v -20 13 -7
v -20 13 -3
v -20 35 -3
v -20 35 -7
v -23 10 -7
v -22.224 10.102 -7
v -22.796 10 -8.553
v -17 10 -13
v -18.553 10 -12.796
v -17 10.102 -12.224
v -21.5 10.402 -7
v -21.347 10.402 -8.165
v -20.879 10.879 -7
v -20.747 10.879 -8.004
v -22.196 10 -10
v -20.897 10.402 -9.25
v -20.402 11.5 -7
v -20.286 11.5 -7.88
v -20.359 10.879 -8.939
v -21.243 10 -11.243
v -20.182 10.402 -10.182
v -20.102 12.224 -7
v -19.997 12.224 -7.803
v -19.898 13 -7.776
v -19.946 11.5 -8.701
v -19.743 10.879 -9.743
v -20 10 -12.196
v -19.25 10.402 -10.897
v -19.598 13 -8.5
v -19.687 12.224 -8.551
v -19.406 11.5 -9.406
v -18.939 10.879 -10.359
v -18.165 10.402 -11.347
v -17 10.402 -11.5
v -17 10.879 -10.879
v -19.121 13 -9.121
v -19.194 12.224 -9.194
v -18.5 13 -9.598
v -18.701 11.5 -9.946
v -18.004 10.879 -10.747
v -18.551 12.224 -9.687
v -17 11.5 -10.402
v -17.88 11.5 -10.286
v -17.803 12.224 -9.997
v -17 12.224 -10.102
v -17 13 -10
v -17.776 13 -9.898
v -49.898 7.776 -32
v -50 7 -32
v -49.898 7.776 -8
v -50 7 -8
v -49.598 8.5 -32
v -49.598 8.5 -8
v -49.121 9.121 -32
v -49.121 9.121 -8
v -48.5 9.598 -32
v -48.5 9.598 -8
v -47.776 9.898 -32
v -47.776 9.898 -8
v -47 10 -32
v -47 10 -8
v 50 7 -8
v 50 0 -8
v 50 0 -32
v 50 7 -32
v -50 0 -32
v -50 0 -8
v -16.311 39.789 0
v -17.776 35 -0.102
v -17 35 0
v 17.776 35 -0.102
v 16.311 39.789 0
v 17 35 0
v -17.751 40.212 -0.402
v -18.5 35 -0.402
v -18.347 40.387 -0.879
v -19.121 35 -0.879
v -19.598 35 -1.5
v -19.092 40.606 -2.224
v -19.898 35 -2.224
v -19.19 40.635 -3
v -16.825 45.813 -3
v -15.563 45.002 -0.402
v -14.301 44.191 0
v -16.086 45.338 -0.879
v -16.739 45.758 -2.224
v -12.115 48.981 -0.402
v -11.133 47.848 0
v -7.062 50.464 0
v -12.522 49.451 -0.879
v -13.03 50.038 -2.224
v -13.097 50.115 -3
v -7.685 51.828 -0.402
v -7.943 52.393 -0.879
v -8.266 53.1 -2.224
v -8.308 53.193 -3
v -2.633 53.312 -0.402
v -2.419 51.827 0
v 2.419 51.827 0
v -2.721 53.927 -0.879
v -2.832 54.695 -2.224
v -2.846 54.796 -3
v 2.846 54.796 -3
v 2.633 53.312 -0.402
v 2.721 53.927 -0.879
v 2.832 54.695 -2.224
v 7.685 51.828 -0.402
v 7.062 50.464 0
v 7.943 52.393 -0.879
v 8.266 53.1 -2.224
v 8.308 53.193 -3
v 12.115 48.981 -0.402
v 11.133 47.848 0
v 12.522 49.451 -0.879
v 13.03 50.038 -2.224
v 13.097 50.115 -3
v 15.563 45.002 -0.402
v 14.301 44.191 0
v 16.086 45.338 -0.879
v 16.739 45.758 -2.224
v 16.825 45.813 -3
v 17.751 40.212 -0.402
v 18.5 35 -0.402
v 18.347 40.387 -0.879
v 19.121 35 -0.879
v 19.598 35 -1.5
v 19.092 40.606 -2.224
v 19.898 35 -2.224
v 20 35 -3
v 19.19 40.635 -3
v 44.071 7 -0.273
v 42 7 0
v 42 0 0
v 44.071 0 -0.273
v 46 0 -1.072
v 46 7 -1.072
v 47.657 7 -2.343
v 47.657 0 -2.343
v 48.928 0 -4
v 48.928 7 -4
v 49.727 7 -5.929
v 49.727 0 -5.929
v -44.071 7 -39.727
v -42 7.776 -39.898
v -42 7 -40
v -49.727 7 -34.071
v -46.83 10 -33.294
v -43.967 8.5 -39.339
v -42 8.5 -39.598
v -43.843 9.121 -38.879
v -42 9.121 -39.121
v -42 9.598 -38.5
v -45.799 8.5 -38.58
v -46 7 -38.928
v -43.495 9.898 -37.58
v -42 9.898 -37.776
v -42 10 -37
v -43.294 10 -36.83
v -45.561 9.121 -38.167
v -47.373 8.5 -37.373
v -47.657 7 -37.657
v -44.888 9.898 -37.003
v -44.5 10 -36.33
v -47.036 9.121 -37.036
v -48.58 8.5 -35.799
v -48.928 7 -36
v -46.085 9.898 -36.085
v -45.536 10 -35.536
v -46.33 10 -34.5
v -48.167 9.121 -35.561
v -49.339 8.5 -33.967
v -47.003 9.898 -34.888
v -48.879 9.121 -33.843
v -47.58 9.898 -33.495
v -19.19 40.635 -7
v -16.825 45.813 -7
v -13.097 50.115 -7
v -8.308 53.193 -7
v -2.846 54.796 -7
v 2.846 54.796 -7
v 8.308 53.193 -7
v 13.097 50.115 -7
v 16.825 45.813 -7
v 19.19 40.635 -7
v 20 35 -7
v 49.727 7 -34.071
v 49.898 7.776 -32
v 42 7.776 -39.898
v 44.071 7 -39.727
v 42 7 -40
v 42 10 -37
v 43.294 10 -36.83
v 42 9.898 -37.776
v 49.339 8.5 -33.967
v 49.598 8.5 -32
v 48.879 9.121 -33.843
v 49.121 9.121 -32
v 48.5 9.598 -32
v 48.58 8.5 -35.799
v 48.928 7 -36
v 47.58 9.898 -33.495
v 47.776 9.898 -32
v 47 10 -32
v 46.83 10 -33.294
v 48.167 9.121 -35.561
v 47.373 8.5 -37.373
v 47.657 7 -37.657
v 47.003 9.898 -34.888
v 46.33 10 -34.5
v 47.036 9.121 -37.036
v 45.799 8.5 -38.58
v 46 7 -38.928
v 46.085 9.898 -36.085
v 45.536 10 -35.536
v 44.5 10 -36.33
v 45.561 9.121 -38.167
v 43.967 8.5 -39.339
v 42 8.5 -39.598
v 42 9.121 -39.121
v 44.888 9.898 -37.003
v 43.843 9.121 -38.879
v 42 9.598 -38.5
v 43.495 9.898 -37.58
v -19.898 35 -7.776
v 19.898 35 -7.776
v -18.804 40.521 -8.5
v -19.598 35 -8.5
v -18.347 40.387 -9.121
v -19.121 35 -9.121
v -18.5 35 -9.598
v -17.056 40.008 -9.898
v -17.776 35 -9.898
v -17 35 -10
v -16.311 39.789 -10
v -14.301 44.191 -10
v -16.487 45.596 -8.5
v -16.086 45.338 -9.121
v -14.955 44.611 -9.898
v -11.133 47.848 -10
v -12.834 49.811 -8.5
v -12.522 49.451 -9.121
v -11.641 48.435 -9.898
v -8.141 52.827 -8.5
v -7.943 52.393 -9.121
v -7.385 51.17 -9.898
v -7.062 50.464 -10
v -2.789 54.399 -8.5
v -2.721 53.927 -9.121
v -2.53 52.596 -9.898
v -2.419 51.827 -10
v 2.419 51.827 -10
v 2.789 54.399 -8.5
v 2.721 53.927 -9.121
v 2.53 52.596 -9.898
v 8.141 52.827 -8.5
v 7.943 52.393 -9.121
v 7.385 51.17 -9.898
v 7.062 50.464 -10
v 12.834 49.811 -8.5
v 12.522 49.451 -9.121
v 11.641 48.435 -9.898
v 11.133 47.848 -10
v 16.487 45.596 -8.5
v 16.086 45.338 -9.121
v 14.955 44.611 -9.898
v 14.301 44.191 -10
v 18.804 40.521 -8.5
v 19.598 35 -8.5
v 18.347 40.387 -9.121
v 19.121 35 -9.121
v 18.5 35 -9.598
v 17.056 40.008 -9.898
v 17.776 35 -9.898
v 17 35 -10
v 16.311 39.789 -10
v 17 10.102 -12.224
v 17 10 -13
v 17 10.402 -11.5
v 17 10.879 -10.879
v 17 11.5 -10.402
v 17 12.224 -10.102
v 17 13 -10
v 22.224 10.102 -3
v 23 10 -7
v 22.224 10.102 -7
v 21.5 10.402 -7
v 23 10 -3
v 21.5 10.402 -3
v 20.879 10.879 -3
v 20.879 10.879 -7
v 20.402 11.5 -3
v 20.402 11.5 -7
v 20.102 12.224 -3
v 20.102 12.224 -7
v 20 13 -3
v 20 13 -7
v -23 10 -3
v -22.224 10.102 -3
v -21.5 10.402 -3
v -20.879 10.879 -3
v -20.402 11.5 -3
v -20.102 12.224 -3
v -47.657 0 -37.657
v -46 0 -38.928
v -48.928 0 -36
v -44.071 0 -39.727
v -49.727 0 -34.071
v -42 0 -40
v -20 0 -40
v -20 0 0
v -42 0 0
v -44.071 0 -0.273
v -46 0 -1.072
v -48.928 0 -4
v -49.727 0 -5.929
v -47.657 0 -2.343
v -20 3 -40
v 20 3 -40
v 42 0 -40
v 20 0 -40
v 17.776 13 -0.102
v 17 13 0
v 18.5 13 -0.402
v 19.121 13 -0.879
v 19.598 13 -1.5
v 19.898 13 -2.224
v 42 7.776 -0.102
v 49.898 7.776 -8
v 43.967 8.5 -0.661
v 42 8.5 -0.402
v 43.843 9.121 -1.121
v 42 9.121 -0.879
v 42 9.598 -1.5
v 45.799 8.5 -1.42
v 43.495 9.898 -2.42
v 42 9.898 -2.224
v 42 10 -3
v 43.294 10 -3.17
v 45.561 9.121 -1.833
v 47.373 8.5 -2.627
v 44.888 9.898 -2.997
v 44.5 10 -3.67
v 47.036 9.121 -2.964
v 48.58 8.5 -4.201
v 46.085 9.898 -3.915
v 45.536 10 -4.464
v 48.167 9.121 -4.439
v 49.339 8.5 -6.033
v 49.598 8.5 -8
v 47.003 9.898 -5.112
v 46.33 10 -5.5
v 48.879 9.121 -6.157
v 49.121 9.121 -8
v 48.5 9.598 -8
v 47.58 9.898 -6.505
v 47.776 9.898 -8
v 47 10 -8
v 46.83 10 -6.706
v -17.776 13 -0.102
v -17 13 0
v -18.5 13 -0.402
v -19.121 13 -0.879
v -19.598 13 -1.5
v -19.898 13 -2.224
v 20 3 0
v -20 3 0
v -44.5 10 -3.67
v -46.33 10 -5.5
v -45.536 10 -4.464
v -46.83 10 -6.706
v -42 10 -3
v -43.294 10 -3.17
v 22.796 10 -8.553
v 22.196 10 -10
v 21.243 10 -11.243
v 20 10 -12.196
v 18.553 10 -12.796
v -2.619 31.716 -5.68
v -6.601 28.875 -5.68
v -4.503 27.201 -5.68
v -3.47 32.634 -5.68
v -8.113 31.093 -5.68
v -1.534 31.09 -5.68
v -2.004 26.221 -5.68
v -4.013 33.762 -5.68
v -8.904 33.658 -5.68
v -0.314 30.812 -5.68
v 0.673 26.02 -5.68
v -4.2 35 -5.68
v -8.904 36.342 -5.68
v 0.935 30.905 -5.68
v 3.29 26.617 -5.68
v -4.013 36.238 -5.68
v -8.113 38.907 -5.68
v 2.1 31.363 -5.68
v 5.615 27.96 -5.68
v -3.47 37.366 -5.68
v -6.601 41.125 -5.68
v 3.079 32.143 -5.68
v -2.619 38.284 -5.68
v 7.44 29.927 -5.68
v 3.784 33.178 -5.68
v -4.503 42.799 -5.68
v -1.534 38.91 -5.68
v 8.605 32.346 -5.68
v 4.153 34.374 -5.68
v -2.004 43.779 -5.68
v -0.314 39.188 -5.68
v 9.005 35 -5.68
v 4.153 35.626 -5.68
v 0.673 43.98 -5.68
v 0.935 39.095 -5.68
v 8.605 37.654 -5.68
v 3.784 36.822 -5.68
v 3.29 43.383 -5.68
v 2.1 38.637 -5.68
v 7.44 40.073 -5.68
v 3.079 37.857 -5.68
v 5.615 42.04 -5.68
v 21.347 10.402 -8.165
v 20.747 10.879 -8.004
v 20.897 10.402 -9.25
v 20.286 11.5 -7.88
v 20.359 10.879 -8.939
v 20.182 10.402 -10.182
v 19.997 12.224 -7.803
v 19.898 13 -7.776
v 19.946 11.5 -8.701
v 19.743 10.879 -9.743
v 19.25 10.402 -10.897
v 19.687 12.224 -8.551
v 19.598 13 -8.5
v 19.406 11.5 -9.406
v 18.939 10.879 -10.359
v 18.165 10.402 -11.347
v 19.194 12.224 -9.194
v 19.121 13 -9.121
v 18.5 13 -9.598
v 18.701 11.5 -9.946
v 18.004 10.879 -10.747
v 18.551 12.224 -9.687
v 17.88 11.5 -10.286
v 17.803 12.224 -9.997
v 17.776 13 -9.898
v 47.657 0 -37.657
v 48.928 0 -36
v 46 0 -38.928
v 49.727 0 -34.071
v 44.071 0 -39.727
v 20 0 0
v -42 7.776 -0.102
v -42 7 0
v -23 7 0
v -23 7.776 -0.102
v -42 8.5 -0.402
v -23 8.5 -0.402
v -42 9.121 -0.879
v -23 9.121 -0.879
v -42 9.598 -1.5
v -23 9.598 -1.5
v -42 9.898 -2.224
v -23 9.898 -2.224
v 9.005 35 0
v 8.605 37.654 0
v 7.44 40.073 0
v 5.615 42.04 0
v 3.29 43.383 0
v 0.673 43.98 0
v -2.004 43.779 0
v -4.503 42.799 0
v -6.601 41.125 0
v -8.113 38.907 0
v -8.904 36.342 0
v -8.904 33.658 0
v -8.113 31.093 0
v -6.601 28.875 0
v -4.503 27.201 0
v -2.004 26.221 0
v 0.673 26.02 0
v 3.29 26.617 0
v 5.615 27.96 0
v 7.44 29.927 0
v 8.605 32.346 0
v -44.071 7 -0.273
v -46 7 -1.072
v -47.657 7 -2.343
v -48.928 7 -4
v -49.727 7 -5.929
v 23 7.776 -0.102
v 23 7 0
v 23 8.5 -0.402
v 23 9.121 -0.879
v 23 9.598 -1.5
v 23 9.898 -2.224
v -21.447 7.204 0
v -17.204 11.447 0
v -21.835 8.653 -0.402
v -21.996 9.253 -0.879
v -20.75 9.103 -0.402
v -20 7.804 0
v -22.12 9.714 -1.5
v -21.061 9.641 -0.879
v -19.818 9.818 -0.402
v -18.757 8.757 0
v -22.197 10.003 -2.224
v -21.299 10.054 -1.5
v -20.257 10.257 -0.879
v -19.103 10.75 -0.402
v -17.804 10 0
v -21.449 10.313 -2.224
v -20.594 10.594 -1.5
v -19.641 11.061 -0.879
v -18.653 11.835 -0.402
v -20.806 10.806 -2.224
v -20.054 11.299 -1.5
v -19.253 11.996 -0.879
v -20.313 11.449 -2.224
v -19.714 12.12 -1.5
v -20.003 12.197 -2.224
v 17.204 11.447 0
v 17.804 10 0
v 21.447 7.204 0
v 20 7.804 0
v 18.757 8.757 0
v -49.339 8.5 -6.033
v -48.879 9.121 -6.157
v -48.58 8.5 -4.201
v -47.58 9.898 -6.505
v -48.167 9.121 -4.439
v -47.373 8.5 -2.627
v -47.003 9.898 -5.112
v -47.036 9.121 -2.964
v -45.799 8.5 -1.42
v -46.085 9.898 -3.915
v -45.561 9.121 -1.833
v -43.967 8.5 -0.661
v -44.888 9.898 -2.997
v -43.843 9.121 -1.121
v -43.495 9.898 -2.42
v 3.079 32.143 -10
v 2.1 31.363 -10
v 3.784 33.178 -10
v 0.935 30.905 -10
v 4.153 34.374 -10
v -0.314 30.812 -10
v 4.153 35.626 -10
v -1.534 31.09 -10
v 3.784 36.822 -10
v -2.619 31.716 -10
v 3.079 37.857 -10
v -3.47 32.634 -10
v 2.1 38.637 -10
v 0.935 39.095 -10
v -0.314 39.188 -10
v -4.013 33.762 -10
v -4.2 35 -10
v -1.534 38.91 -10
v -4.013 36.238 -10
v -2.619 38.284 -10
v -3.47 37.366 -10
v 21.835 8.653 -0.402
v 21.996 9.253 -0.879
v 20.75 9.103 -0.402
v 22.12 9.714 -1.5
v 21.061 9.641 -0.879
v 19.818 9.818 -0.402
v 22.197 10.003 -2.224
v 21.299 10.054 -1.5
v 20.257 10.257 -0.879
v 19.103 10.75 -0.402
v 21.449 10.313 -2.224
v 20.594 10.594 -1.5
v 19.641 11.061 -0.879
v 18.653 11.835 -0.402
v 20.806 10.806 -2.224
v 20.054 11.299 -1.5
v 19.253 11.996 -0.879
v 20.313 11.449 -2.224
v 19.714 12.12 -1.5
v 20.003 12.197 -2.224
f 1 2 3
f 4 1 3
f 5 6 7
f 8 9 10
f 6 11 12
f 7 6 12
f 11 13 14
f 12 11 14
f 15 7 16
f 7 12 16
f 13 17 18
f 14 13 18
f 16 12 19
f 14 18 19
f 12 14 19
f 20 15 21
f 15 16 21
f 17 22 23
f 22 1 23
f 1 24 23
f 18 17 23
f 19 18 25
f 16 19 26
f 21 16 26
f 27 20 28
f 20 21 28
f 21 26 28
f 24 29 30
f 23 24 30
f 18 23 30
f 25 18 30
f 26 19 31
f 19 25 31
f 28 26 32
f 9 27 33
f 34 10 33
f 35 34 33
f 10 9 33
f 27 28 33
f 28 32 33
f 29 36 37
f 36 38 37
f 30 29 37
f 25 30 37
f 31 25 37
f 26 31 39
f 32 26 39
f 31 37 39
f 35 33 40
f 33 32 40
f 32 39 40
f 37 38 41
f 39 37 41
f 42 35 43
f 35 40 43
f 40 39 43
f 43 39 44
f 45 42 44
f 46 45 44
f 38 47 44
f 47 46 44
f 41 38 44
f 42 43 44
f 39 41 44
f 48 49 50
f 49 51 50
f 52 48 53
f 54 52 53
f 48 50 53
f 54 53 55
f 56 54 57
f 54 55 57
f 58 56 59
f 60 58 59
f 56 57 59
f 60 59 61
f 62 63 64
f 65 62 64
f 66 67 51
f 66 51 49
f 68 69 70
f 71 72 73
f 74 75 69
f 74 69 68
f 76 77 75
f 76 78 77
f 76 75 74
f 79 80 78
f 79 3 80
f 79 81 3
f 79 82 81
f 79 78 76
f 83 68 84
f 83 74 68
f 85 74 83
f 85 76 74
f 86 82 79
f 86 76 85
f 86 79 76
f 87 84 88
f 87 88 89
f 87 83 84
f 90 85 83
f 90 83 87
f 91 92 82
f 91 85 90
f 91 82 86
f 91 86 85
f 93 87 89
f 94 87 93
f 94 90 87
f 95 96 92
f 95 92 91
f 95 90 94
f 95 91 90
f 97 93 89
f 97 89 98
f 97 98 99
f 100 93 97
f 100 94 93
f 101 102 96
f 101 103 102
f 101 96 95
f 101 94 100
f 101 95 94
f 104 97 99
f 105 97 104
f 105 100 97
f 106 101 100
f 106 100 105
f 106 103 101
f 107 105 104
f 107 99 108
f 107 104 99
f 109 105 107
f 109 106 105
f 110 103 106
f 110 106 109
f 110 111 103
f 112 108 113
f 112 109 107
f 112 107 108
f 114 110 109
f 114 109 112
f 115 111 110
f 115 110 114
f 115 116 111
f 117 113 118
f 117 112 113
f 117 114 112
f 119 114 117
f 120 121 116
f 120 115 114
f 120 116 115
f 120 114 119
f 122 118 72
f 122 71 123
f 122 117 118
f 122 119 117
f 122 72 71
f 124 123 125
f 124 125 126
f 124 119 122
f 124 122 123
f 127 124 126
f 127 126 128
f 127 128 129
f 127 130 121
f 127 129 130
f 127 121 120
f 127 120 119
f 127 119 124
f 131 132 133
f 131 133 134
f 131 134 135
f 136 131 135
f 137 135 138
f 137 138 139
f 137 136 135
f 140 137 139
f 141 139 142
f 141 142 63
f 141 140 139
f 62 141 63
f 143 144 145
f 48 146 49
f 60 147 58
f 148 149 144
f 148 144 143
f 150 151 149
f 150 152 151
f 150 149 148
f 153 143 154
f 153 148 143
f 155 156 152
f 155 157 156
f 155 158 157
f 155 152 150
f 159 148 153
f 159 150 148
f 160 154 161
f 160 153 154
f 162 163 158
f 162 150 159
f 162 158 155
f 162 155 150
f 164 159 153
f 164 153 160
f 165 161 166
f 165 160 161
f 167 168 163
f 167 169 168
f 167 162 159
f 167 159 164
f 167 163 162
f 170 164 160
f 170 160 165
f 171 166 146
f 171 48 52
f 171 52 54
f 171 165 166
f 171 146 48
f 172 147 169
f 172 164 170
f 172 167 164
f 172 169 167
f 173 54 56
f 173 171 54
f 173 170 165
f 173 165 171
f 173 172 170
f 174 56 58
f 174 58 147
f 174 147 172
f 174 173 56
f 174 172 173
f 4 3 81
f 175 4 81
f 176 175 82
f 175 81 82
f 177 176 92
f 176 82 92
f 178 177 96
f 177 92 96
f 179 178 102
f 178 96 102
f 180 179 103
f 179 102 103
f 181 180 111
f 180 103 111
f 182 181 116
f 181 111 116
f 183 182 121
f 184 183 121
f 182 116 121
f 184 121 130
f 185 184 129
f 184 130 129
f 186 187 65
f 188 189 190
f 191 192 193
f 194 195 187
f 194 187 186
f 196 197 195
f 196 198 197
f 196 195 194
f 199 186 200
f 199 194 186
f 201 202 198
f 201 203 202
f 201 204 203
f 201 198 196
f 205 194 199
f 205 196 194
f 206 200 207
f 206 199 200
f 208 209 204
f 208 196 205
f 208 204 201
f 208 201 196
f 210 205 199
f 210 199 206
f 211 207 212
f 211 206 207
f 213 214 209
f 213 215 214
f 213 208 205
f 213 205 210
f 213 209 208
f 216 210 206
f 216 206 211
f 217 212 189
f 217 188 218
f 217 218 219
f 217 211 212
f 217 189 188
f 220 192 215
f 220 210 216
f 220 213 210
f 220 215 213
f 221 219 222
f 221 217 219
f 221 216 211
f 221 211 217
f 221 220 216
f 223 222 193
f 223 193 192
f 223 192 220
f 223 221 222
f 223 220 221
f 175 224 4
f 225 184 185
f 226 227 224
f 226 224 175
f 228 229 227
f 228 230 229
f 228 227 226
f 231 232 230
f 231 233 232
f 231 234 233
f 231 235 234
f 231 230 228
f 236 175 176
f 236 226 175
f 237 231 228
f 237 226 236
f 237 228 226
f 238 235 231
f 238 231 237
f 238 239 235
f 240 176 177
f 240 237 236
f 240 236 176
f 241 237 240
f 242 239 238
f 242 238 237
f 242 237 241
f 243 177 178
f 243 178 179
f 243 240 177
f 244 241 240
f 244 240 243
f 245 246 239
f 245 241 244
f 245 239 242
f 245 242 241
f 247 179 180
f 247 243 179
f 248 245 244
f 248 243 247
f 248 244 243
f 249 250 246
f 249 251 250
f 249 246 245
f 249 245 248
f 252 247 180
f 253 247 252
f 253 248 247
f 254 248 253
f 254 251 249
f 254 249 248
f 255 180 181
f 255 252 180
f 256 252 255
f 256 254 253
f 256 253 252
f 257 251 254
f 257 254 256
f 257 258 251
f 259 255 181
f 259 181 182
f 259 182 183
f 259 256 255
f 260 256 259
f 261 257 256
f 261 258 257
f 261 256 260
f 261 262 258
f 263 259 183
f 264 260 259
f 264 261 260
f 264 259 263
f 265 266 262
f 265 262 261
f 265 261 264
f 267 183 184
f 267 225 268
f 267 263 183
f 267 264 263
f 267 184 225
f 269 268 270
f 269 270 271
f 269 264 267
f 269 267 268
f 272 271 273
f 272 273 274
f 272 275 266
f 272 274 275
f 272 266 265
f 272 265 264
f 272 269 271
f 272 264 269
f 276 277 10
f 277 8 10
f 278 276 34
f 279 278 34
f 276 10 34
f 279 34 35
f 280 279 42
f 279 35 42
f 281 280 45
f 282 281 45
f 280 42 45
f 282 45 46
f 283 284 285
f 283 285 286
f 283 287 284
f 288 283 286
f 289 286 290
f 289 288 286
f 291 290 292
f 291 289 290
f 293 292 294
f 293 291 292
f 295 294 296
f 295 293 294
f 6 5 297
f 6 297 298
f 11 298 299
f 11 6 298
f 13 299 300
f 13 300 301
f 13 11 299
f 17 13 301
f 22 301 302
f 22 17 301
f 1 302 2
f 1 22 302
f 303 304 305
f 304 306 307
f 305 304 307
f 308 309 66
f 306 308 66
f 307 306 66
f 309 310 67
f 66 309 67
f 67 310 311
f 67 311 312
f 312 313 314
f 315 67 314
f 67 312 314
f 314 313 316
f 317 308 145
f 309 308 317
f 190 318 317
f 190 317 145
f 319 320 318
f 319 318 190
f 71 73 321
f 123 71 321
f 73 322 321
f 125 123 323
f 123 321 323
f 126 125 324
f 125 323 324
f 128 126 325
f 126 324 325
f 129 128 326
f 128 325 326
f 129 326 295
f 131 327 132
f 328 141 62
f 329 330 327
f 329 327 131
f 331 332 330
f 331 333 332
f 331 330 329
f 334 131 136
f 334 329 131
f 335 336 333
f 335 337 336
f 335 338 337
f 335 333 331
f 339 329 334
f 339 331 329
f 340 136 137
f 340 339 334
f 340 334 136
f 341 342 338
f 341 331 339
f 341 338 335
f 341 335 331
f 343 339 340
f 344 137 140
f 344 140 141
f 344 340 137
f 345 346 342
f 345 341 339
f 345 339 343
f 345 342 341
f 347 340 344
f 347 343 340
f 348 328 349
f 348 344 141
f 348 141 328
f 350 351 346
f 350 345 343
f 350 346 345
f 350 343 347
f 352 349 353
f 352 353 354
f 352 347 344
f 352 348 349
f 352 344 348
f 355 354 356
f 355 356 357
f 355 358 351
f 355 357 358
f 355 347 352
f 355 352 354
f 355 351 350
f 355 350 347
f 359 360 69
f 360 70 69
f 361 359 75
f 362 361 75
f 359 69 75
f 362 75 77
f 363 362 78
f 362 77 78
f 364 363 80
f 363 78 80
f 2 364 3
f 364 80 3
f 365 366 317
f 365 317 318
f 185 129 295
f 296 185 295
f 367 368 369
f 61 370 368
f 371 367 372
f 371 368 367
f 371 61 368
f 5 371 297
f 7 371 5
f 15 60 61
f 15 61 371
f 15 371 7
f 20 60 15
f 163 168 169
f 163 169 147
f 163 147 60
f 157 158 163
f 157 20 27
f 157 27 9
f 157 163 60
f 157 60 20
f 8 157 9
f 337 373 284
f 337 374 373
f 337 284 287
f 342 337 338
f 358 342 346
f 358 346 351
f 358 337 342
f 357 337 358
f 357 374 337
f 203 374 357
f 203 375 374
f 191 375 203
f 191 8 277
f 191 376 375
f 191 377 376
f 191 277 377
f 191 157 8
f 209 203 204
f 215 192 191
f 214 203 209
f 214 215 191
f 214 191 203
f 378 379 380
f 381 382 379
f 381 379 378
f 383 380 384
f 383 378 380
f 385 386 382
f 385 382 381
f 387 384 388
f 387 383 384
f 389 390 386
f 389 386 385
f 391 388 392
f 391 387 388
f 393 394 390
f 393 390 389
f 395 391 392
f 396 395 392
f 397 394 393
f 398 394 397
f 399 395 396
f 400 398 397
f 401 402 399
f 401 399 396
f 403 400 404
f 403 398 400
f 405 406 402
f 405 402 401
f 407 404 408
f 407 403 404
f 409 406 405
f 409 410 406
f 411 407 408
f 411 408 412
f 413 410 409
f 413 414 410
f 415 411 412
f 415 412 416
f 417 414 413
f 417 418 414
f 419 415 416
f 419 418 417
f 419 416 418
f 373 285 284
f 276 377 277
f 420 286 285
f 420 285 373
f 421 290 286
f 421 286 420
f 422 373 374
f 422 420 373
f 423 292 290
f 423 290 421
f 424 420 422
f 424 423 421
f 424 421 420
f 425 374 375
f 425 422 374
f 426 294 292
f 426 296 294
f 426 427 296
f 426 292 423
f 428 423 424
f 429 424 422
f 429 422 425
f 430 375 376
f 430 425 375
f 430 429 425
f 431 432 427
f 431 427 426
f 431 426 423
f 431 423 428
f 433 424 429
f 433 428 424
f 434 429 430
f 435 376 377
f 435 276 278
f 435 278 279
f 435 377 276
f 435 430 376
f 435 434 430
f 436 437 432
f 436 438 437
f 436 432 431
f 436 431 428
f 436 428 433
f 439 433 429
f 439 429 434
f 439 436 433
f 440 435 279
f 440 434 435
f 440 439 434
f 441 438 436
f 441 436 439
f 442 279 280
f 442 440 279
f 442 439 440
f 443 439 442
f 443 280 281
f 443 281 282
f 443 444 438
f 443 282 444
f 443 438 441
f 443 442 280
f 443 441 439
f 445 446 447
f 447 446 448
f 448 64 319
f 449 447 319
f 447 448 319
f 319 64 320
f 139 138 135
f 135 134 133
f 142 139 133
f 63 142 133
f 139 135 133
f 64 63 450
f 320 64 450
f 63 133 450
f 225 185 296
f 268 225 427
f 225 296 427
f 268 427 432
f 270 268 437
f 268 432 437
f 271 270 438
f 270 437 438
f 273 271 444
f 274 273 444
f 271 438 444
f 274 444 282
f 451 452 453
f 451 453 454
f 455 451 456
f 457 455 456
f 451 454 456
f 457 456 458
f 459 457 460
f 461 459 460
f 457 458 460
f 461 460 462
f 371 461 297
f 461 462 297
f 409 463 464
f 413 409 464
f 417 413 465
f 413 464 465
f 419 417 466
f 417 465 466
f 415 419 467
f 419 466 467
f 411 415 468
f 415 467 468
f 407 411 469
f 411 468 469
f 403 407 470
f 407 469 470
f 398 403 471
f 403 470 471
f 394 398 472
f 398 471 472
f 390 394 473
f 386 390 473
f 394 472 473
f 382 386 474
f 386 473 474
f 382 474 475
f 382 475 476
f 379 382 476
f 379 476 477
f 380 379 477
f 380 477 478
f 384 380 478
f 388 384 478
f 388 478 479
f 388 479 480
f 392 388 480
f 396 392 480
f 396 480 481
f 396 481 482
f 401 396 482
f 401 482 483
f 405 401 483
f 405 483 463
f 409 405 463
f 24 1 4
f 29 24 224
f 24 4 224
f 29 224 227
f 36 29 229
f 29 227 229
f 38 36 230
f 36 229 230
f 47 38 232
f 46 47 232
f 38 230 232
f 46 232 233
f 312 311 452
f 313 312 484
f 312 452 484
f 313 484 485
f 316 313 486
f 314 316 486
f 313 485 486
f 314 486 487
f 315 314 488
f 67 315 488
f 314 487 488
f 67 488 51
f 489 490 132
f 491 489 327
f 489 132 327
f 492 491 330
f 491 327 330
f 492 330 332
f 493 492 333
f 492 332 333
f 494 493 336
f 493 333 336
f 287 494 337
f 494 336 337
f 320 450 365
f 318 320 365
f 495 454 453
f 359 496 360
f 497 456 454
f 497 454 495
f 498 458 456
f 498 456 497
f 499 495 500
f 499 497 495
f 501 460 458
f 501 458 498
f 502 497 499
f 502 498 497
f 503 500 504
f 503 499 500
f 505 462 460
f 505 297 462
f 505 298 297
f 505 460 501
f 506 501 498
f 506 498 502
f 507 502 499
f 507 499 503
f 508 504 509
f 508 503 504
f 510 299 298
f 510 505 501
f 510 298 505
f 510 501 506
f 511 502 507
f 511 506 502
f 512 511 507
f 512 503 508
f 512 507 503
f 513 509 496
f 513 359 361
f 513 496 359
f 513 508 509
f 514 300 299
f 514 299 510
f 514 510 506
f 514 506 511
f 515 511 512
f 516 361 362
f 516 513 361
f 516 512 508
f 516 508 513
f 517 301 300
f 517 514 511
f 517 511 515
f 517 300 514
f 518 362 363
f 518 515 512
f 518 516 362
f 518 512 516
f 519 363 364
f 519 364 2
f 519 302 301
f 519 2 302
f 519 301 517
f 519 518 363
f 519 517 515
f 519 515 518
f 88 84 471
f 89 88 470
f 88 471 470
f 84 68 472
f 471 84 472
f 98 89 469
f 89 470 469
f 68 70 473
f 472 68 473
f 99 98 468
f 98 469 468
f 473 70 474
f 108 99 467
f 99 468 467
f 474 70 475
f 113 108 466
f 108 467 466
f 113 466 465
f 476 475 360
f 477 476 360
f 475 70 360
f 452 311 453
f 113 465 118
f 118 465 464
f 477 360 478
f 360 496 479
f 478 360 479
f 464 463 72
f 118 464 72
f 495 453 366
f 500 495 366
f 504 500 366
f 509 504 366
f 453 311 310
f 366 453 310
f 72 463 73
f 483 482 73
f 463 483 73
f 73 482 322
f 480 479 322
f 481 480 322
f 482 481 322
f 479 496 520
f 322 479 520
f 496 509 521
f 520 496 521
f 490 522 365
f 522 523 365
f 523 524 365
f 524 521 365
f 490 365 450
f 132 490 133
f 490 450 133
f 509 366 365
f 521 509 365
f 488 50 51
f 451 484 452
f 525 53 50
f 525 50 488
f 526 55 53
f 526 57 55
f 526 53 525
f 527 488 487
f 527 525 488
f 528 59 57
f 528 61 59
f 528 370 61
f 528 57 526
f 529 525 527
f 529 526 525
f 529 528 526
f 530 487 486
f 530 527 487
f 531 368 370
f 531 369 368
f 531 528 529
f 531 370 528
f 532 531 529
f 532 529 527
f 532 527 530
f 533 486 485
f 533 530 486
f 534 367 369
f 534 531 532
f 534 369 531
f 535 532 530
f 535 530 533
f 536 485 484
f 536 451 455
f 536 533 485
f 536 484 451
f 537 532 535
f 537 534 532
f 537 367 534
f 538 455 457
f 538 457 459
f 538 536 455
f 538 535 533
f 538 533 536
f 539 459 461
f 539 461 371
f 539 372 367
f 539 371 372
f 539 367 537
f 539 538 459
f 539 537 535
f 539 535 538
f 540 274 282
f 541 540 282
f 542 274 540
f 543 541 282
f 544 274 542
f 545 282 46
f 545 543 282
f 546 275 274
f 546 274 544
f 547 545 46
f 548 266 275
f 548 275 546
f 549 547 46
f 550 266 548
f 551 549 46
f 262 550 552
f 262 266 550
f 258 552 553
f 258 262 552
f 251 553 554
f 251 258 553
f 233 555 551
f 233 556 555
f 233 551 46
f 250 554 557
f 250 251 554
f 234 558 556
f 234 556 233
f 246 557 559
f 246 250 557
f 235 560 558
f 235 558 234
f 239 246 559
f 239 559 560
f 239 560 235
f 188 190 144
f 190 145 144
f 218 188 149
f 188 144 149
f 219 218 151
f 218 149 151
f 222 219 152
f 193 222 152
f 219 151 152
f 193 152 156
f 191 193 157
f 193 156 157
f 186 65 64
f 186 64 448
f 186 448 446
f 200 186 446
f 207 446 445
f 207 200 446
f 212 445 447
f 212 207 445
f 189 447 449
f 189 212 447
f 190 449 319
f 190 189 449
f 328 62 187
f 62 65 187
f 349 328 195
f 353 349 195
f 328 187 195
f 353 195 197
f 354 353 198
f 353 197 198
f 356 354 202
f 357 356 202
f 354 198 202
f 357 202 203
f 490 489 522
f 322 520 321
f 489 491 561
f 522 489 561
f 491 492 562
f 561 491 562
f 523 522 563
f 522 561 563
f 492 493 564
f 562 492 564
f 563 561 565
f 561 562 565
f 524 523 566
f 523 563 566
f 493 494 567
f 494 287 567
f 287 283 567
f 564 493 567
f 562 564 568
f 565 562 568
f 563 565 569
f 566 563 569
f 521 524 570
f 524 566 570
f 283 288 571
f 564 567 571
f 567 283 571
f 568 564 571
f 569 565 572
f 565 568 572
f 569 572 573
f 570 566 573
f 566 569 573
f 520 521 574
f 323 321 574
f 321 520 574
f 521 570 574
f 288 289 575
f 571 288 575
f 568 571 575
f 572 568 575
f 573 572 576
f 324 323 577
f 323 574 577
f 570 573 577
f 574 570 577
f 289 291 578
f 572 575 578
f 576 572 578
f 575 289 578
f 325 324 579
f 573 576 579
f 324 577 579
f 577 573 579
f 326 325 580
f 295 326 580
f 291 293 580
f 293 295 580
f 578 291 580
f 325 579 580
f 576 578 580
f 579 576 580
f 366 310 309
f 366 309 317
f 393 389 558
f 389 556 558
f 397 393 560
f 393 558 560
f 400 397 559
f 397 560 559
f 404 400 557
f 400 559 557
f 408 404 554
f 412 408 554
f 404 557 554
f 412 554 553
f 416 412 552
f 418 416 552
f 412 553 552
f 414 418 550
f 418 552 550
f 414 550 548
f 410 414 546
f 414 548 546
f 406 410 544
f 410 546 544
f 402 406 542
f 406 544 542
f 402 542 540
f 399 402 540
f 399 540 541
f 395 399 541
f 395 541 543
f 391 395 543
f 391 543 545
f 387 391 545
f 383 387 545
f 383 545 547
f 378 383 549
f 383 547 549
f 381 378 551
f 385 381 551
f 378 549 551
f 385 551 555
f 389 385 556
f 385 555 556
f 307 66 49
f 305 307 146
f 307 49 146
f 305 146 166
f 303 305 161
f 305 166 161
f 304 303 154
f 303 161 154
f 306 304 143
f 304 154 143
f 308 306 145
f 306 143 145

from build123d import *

# Parameters (mm, degrees)
SKETCH_1_W                   = 100
SKETCH_1_H                   = 40
EXTRUDE_1_DEPTH              = 10
EXTRUDE_2_DEPTH              = 10
SKETCH_3_W                   = 40
SKETCH_3_H                   = 3
CUT_EXTRUDE_1_DEPTH          = 85.409715081
HOLE_WIZARD_M8_1_D           = 8.4
HOLE_WIZARD_M8_1_CBORE_D     = 18.01
HOLE_WIZARD_M8_1_CBORE_DEPTH = 5.68
FILLET_1_R                   = 8
FILLET_2_R                   = 3


with BuildPart() as part:
    # 스케치1 → 보스-돌출1 (new body)
    with BuildSketch(Plane(origin=(0, 0, 0), x_dir=(1, 0, 0), z_dir=(0, 1, 0))):
        with Locations((0, 20)):
            Rectangle(SKETCH_1_W, SKETCH_1_H)
    extrude(amount=EXTRUDE_1_DEPTH)

    # 스케치2 → 보스-돌출2 (add)
    with BuildSketch(Plane.XY):
        with BuildLine():
            Line((-20, 0), (-20, 35))
            ThreePointArc((-20, 35), (0, 55), (20, 35))
            Line((20, 35), (20, 0))
            Line((20, 0), (-20, 0))
        make_face()
    extrude(amount=-EXTRUDE_2_DEPTH)

    # 스케치3 → 컷-돌출1 (cut, through all)
    with BuildSketch(Plane.XY):
        with Locations((0, 1.5)):
            Rectangle(SKETCH_3_W, SKETCH_3_H)
    extrude(amount=-CUT_EXTRUDE_1_DEPTH, mode=Mode.SUBTRACT)

    # M8 육각 머리 볼트용 카운터보어1 (through all)
    with Locations(Plane(origin=(0, 35, 0), x_dir=(1, 0, 0), z_dir=(0, 0, 1))):
        with Locations((0, 0)):
            CounterBoreHole(HOLE_WIZARD_M8_1_D / 2, HOLE_WIZARD_M8_1_CBORE_D / 2, HOLE_WIZARD_M8_1_CBORE_DEPTH)

    # 필렛1
    fillet_1_edges = [part.edges().sort_by_distance(p)[0] for p in [
        (-50, 5, -40),
        (50, 5, -40),
        (50, 5, 0),
        (-50, 5, 0),
    ]]
    fillet(fillet_1_edges, radius=FILLET_1_R)

    # 필렛2
    fillet_2_edges = [part.edges().sort_by_distance(p)[0] for p in [
        (31, 10, 0),
        (-20, 22.5, -10),
        (20, 22.5, -10),
        (-20, 22.5, 0),
        (20, 22.5, 0),
        (0, 55, 0),
        (-20, 10, -5),
        (0, 55, -10),
        (20, 10, -5),
        (0, 10, -10),
        (-31, 10, 0),
        (-50, 10, -20),
        (50, 10, -20),
        (0, 10, -40),
        (47.656854249, 10, -37.656854249),
        (47.656854249, 10, -2.343145751),
        (-47.656854249, 10, -37.656854249),
        (-47.656854249, 10, -2.343145751),
    ]]
    fillet(fillet_2_edges, radius=FILLET_2_R)


solid = part.part
